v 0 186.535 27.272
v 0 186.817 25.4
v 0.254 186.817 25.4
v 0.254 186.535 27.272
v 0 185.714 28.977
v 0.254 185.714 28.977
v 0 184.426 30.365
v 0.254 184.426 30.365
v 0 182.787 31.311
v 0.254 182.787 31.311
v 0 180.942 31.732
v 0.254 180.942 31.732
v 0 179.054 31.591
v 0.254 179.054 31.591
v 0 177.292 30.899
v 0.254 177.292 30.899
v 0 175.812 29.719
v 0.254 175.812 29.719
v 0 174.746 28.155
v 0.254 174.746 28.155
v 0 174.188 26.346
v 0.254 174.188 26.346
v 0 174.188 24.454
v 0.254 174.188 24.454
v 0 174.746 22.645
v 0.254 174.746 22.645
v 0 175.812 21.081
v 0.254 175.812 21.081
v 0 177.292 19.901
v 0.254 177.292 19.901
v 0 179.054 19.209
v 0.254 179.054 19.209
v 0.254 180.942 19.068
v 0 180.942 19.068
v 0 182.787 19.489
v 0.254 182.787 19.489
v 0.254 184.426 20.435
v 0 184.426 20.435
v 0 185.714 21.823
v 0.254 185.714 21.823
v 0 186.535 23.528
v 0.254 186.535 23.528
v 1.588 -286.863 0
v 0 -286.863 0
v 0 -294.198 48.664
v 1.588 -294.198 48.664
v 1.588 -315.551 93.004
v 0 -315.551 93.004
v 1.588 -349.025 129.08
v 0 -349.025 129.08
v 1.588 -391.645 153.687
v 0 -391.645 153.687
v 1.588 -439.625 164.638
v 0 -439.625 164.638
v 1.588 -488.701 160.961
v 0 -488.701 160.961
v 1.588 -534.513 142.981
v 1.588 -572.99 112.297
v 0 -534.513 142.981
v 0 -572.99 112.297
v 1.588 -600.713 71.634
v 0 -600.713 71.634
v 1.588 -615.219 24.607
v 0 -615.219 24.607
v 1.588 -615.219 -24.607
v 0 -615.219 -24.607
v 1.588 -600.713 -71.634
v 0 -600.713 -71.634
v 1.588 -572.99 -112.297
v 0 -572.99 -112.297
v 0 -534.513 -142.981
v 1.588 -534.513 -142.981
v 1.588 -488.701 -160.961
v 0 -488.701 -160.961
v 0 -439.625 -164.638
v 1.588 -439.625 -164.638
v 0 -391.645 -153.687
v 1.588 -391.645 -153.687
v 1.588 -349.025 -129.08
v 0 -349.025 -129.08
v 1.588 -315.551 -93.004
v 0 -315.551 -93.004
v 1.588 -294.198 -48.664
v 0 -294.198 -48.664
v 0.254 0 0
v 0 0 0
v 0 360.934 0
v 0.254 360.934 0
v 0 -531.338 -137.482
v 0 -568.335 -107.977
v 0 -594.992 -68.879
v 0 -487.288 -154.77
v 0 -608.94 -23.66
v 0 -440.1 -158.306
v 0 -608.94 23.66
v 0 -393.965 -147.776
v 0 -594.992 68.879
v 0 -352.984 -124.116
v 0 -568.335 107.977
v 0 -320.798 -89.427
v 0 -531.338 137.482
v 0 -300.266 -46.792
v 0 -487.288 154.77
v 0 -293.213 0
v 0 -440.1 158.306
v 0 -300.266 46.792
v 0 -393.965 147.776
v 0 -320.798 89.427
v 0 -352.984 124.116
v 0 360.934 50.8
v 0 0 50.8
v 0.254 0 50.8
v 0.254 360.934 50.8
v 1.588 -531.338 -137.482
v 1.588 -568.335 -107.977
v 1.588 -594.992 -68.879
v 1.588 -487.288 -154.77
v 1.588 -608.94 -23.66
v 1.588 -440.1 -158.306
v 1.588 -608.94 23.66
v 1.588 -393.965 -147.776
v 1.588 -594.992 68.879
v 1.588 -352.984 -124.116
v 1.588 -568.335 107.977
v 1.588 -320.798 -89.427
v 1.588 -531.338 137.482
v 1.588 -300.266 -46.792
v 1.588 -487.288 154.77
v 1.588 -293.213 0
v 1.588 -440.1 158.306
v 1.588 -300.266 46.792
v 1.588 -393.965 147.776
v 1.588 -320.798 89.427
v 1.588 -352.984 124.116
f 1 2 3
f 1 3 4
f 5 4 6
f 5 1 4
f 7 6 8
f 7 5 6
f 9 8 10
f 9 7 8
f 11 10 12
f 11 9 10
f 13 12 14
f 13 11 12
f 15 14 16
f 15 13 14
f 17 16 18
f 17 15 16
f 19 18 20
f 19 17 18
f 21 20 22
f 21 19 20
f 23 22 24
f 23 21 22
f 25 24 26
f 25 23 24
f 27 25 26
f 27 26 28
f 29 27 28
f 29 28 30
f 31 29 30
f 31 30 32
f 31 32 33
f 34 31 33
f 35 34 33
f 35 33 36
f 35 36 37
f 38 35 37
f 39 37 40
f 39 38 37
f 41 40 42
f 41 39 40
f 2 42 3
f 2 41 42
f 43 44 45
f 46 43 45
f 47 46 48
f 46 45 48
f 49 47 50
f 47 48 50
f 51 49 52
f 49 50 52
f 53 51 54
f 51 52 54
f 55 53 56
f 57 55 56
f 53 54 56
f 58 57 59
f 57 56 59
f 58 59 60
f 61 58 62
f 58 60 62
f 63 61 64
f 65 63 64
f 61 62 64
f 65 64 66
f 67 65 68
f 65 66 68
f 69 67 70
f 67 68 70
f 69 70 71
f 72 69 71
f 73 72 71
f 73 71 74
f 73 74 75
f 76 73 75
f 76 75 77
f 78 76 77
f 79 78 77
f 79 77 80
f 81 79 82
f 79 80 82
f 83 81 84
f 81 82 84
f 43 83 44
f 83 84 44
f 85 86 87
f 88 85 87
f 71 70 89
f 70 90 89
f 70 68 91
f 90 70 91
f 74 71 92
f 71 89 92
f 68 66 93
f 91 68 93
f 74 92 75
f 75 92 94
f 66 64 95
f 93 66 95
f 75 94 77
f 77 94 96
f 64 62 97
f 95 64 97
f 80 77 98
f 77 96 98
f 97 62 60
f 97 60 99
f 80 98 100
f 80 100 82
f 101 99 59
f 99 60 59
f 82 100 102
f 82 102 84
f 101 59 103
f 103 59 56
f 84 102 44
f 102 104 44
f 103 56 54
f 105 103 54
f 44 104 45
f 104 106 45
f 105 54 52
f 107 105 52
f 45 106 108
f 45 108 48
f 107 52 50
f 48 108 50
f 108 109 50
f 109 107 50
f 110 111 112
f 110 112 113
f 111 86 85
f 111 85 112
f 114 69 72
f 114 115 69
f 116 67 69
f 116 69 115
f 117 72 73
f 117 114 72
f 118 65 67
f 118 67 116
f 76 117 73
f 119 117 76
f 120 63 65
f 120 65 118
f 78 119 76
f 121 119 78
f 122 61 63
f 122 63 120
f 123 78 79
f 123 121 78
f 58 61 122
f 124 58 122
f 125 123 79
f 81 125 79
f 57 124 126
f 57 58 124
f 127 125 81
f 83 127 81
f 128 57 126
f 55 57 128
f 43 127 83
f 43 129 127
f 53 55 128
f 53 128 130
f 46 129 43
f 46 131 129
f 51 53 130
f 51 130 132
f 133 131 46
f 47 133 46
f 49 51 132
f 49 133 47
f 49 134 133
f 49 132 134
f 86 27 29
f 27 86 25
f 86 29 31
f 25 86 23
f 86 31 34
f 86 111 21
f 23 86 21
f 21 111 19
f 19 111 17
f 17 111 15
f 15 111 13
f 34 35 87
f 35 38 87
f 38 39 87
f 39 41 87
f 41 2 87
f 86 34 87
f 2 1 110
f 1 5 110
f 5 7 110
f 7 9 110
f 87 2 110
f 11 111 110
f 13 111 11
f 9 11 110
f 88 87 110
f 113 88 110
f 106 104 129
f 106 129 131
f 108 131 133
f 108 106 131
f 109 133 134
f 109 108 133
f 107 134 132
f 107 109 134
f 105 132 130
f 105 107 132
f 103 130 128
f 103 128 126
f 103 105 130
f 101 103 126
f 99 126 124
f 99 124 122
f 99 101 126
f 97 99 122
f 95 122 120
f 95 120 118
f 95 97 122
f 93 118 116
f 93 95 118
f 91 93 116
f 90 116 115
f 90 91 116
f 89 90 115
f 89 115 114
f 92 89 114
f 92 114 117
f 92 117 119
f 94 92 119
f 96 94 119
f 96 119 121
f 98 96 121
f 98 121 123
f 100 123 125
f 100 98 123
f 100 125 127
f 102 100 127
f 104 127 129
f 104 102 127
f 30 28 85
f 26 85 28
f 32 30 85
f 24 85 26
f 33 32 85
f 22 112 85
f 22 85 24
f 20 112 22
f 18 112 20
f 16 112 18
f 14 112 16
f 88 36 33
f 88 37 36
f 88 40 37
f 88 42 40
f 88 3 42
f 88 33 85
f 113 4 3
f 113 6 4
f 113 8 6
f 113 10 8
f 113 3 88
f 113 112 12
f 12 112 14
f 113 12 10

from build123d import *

# Parameters (mm, degrees)
F0_W     = 360.934
F0_H     = 50.8
F0_R     = 6.35
F1_DEPTH = 0.254
F2_R     = 165.1
F2_R_2   = 158.75
F3_DEPTH = 1.5875


with BuildPart() as f1:
    # F0 (on Right) → F1 (new body)
    with BuildSketch(Plane.YZ):
        with Locations((180.467, 25.4)):
            Rectangle(F0_W, F0_H)
        with Locations((180.467, 25.4)):
            Circle(F0_R, mode=Mode.SUBTRACT)
    extrude(amount=F1_DEPTH)


with BuildPart() as f3:
    # F2 (on Right) → F3 (new body)
    with BuildSketch(Plane.YZ):
        with Locations((-451.962993, 0)):
            Circle(F2_R)
        with Locations((-451.962993, 0)):
            Circle(F2_R_2, mode=Mode.SUBTRACT)
    extrude(amount=F3_DEPTH)


solid = Compound([f1.part, f3.part])
